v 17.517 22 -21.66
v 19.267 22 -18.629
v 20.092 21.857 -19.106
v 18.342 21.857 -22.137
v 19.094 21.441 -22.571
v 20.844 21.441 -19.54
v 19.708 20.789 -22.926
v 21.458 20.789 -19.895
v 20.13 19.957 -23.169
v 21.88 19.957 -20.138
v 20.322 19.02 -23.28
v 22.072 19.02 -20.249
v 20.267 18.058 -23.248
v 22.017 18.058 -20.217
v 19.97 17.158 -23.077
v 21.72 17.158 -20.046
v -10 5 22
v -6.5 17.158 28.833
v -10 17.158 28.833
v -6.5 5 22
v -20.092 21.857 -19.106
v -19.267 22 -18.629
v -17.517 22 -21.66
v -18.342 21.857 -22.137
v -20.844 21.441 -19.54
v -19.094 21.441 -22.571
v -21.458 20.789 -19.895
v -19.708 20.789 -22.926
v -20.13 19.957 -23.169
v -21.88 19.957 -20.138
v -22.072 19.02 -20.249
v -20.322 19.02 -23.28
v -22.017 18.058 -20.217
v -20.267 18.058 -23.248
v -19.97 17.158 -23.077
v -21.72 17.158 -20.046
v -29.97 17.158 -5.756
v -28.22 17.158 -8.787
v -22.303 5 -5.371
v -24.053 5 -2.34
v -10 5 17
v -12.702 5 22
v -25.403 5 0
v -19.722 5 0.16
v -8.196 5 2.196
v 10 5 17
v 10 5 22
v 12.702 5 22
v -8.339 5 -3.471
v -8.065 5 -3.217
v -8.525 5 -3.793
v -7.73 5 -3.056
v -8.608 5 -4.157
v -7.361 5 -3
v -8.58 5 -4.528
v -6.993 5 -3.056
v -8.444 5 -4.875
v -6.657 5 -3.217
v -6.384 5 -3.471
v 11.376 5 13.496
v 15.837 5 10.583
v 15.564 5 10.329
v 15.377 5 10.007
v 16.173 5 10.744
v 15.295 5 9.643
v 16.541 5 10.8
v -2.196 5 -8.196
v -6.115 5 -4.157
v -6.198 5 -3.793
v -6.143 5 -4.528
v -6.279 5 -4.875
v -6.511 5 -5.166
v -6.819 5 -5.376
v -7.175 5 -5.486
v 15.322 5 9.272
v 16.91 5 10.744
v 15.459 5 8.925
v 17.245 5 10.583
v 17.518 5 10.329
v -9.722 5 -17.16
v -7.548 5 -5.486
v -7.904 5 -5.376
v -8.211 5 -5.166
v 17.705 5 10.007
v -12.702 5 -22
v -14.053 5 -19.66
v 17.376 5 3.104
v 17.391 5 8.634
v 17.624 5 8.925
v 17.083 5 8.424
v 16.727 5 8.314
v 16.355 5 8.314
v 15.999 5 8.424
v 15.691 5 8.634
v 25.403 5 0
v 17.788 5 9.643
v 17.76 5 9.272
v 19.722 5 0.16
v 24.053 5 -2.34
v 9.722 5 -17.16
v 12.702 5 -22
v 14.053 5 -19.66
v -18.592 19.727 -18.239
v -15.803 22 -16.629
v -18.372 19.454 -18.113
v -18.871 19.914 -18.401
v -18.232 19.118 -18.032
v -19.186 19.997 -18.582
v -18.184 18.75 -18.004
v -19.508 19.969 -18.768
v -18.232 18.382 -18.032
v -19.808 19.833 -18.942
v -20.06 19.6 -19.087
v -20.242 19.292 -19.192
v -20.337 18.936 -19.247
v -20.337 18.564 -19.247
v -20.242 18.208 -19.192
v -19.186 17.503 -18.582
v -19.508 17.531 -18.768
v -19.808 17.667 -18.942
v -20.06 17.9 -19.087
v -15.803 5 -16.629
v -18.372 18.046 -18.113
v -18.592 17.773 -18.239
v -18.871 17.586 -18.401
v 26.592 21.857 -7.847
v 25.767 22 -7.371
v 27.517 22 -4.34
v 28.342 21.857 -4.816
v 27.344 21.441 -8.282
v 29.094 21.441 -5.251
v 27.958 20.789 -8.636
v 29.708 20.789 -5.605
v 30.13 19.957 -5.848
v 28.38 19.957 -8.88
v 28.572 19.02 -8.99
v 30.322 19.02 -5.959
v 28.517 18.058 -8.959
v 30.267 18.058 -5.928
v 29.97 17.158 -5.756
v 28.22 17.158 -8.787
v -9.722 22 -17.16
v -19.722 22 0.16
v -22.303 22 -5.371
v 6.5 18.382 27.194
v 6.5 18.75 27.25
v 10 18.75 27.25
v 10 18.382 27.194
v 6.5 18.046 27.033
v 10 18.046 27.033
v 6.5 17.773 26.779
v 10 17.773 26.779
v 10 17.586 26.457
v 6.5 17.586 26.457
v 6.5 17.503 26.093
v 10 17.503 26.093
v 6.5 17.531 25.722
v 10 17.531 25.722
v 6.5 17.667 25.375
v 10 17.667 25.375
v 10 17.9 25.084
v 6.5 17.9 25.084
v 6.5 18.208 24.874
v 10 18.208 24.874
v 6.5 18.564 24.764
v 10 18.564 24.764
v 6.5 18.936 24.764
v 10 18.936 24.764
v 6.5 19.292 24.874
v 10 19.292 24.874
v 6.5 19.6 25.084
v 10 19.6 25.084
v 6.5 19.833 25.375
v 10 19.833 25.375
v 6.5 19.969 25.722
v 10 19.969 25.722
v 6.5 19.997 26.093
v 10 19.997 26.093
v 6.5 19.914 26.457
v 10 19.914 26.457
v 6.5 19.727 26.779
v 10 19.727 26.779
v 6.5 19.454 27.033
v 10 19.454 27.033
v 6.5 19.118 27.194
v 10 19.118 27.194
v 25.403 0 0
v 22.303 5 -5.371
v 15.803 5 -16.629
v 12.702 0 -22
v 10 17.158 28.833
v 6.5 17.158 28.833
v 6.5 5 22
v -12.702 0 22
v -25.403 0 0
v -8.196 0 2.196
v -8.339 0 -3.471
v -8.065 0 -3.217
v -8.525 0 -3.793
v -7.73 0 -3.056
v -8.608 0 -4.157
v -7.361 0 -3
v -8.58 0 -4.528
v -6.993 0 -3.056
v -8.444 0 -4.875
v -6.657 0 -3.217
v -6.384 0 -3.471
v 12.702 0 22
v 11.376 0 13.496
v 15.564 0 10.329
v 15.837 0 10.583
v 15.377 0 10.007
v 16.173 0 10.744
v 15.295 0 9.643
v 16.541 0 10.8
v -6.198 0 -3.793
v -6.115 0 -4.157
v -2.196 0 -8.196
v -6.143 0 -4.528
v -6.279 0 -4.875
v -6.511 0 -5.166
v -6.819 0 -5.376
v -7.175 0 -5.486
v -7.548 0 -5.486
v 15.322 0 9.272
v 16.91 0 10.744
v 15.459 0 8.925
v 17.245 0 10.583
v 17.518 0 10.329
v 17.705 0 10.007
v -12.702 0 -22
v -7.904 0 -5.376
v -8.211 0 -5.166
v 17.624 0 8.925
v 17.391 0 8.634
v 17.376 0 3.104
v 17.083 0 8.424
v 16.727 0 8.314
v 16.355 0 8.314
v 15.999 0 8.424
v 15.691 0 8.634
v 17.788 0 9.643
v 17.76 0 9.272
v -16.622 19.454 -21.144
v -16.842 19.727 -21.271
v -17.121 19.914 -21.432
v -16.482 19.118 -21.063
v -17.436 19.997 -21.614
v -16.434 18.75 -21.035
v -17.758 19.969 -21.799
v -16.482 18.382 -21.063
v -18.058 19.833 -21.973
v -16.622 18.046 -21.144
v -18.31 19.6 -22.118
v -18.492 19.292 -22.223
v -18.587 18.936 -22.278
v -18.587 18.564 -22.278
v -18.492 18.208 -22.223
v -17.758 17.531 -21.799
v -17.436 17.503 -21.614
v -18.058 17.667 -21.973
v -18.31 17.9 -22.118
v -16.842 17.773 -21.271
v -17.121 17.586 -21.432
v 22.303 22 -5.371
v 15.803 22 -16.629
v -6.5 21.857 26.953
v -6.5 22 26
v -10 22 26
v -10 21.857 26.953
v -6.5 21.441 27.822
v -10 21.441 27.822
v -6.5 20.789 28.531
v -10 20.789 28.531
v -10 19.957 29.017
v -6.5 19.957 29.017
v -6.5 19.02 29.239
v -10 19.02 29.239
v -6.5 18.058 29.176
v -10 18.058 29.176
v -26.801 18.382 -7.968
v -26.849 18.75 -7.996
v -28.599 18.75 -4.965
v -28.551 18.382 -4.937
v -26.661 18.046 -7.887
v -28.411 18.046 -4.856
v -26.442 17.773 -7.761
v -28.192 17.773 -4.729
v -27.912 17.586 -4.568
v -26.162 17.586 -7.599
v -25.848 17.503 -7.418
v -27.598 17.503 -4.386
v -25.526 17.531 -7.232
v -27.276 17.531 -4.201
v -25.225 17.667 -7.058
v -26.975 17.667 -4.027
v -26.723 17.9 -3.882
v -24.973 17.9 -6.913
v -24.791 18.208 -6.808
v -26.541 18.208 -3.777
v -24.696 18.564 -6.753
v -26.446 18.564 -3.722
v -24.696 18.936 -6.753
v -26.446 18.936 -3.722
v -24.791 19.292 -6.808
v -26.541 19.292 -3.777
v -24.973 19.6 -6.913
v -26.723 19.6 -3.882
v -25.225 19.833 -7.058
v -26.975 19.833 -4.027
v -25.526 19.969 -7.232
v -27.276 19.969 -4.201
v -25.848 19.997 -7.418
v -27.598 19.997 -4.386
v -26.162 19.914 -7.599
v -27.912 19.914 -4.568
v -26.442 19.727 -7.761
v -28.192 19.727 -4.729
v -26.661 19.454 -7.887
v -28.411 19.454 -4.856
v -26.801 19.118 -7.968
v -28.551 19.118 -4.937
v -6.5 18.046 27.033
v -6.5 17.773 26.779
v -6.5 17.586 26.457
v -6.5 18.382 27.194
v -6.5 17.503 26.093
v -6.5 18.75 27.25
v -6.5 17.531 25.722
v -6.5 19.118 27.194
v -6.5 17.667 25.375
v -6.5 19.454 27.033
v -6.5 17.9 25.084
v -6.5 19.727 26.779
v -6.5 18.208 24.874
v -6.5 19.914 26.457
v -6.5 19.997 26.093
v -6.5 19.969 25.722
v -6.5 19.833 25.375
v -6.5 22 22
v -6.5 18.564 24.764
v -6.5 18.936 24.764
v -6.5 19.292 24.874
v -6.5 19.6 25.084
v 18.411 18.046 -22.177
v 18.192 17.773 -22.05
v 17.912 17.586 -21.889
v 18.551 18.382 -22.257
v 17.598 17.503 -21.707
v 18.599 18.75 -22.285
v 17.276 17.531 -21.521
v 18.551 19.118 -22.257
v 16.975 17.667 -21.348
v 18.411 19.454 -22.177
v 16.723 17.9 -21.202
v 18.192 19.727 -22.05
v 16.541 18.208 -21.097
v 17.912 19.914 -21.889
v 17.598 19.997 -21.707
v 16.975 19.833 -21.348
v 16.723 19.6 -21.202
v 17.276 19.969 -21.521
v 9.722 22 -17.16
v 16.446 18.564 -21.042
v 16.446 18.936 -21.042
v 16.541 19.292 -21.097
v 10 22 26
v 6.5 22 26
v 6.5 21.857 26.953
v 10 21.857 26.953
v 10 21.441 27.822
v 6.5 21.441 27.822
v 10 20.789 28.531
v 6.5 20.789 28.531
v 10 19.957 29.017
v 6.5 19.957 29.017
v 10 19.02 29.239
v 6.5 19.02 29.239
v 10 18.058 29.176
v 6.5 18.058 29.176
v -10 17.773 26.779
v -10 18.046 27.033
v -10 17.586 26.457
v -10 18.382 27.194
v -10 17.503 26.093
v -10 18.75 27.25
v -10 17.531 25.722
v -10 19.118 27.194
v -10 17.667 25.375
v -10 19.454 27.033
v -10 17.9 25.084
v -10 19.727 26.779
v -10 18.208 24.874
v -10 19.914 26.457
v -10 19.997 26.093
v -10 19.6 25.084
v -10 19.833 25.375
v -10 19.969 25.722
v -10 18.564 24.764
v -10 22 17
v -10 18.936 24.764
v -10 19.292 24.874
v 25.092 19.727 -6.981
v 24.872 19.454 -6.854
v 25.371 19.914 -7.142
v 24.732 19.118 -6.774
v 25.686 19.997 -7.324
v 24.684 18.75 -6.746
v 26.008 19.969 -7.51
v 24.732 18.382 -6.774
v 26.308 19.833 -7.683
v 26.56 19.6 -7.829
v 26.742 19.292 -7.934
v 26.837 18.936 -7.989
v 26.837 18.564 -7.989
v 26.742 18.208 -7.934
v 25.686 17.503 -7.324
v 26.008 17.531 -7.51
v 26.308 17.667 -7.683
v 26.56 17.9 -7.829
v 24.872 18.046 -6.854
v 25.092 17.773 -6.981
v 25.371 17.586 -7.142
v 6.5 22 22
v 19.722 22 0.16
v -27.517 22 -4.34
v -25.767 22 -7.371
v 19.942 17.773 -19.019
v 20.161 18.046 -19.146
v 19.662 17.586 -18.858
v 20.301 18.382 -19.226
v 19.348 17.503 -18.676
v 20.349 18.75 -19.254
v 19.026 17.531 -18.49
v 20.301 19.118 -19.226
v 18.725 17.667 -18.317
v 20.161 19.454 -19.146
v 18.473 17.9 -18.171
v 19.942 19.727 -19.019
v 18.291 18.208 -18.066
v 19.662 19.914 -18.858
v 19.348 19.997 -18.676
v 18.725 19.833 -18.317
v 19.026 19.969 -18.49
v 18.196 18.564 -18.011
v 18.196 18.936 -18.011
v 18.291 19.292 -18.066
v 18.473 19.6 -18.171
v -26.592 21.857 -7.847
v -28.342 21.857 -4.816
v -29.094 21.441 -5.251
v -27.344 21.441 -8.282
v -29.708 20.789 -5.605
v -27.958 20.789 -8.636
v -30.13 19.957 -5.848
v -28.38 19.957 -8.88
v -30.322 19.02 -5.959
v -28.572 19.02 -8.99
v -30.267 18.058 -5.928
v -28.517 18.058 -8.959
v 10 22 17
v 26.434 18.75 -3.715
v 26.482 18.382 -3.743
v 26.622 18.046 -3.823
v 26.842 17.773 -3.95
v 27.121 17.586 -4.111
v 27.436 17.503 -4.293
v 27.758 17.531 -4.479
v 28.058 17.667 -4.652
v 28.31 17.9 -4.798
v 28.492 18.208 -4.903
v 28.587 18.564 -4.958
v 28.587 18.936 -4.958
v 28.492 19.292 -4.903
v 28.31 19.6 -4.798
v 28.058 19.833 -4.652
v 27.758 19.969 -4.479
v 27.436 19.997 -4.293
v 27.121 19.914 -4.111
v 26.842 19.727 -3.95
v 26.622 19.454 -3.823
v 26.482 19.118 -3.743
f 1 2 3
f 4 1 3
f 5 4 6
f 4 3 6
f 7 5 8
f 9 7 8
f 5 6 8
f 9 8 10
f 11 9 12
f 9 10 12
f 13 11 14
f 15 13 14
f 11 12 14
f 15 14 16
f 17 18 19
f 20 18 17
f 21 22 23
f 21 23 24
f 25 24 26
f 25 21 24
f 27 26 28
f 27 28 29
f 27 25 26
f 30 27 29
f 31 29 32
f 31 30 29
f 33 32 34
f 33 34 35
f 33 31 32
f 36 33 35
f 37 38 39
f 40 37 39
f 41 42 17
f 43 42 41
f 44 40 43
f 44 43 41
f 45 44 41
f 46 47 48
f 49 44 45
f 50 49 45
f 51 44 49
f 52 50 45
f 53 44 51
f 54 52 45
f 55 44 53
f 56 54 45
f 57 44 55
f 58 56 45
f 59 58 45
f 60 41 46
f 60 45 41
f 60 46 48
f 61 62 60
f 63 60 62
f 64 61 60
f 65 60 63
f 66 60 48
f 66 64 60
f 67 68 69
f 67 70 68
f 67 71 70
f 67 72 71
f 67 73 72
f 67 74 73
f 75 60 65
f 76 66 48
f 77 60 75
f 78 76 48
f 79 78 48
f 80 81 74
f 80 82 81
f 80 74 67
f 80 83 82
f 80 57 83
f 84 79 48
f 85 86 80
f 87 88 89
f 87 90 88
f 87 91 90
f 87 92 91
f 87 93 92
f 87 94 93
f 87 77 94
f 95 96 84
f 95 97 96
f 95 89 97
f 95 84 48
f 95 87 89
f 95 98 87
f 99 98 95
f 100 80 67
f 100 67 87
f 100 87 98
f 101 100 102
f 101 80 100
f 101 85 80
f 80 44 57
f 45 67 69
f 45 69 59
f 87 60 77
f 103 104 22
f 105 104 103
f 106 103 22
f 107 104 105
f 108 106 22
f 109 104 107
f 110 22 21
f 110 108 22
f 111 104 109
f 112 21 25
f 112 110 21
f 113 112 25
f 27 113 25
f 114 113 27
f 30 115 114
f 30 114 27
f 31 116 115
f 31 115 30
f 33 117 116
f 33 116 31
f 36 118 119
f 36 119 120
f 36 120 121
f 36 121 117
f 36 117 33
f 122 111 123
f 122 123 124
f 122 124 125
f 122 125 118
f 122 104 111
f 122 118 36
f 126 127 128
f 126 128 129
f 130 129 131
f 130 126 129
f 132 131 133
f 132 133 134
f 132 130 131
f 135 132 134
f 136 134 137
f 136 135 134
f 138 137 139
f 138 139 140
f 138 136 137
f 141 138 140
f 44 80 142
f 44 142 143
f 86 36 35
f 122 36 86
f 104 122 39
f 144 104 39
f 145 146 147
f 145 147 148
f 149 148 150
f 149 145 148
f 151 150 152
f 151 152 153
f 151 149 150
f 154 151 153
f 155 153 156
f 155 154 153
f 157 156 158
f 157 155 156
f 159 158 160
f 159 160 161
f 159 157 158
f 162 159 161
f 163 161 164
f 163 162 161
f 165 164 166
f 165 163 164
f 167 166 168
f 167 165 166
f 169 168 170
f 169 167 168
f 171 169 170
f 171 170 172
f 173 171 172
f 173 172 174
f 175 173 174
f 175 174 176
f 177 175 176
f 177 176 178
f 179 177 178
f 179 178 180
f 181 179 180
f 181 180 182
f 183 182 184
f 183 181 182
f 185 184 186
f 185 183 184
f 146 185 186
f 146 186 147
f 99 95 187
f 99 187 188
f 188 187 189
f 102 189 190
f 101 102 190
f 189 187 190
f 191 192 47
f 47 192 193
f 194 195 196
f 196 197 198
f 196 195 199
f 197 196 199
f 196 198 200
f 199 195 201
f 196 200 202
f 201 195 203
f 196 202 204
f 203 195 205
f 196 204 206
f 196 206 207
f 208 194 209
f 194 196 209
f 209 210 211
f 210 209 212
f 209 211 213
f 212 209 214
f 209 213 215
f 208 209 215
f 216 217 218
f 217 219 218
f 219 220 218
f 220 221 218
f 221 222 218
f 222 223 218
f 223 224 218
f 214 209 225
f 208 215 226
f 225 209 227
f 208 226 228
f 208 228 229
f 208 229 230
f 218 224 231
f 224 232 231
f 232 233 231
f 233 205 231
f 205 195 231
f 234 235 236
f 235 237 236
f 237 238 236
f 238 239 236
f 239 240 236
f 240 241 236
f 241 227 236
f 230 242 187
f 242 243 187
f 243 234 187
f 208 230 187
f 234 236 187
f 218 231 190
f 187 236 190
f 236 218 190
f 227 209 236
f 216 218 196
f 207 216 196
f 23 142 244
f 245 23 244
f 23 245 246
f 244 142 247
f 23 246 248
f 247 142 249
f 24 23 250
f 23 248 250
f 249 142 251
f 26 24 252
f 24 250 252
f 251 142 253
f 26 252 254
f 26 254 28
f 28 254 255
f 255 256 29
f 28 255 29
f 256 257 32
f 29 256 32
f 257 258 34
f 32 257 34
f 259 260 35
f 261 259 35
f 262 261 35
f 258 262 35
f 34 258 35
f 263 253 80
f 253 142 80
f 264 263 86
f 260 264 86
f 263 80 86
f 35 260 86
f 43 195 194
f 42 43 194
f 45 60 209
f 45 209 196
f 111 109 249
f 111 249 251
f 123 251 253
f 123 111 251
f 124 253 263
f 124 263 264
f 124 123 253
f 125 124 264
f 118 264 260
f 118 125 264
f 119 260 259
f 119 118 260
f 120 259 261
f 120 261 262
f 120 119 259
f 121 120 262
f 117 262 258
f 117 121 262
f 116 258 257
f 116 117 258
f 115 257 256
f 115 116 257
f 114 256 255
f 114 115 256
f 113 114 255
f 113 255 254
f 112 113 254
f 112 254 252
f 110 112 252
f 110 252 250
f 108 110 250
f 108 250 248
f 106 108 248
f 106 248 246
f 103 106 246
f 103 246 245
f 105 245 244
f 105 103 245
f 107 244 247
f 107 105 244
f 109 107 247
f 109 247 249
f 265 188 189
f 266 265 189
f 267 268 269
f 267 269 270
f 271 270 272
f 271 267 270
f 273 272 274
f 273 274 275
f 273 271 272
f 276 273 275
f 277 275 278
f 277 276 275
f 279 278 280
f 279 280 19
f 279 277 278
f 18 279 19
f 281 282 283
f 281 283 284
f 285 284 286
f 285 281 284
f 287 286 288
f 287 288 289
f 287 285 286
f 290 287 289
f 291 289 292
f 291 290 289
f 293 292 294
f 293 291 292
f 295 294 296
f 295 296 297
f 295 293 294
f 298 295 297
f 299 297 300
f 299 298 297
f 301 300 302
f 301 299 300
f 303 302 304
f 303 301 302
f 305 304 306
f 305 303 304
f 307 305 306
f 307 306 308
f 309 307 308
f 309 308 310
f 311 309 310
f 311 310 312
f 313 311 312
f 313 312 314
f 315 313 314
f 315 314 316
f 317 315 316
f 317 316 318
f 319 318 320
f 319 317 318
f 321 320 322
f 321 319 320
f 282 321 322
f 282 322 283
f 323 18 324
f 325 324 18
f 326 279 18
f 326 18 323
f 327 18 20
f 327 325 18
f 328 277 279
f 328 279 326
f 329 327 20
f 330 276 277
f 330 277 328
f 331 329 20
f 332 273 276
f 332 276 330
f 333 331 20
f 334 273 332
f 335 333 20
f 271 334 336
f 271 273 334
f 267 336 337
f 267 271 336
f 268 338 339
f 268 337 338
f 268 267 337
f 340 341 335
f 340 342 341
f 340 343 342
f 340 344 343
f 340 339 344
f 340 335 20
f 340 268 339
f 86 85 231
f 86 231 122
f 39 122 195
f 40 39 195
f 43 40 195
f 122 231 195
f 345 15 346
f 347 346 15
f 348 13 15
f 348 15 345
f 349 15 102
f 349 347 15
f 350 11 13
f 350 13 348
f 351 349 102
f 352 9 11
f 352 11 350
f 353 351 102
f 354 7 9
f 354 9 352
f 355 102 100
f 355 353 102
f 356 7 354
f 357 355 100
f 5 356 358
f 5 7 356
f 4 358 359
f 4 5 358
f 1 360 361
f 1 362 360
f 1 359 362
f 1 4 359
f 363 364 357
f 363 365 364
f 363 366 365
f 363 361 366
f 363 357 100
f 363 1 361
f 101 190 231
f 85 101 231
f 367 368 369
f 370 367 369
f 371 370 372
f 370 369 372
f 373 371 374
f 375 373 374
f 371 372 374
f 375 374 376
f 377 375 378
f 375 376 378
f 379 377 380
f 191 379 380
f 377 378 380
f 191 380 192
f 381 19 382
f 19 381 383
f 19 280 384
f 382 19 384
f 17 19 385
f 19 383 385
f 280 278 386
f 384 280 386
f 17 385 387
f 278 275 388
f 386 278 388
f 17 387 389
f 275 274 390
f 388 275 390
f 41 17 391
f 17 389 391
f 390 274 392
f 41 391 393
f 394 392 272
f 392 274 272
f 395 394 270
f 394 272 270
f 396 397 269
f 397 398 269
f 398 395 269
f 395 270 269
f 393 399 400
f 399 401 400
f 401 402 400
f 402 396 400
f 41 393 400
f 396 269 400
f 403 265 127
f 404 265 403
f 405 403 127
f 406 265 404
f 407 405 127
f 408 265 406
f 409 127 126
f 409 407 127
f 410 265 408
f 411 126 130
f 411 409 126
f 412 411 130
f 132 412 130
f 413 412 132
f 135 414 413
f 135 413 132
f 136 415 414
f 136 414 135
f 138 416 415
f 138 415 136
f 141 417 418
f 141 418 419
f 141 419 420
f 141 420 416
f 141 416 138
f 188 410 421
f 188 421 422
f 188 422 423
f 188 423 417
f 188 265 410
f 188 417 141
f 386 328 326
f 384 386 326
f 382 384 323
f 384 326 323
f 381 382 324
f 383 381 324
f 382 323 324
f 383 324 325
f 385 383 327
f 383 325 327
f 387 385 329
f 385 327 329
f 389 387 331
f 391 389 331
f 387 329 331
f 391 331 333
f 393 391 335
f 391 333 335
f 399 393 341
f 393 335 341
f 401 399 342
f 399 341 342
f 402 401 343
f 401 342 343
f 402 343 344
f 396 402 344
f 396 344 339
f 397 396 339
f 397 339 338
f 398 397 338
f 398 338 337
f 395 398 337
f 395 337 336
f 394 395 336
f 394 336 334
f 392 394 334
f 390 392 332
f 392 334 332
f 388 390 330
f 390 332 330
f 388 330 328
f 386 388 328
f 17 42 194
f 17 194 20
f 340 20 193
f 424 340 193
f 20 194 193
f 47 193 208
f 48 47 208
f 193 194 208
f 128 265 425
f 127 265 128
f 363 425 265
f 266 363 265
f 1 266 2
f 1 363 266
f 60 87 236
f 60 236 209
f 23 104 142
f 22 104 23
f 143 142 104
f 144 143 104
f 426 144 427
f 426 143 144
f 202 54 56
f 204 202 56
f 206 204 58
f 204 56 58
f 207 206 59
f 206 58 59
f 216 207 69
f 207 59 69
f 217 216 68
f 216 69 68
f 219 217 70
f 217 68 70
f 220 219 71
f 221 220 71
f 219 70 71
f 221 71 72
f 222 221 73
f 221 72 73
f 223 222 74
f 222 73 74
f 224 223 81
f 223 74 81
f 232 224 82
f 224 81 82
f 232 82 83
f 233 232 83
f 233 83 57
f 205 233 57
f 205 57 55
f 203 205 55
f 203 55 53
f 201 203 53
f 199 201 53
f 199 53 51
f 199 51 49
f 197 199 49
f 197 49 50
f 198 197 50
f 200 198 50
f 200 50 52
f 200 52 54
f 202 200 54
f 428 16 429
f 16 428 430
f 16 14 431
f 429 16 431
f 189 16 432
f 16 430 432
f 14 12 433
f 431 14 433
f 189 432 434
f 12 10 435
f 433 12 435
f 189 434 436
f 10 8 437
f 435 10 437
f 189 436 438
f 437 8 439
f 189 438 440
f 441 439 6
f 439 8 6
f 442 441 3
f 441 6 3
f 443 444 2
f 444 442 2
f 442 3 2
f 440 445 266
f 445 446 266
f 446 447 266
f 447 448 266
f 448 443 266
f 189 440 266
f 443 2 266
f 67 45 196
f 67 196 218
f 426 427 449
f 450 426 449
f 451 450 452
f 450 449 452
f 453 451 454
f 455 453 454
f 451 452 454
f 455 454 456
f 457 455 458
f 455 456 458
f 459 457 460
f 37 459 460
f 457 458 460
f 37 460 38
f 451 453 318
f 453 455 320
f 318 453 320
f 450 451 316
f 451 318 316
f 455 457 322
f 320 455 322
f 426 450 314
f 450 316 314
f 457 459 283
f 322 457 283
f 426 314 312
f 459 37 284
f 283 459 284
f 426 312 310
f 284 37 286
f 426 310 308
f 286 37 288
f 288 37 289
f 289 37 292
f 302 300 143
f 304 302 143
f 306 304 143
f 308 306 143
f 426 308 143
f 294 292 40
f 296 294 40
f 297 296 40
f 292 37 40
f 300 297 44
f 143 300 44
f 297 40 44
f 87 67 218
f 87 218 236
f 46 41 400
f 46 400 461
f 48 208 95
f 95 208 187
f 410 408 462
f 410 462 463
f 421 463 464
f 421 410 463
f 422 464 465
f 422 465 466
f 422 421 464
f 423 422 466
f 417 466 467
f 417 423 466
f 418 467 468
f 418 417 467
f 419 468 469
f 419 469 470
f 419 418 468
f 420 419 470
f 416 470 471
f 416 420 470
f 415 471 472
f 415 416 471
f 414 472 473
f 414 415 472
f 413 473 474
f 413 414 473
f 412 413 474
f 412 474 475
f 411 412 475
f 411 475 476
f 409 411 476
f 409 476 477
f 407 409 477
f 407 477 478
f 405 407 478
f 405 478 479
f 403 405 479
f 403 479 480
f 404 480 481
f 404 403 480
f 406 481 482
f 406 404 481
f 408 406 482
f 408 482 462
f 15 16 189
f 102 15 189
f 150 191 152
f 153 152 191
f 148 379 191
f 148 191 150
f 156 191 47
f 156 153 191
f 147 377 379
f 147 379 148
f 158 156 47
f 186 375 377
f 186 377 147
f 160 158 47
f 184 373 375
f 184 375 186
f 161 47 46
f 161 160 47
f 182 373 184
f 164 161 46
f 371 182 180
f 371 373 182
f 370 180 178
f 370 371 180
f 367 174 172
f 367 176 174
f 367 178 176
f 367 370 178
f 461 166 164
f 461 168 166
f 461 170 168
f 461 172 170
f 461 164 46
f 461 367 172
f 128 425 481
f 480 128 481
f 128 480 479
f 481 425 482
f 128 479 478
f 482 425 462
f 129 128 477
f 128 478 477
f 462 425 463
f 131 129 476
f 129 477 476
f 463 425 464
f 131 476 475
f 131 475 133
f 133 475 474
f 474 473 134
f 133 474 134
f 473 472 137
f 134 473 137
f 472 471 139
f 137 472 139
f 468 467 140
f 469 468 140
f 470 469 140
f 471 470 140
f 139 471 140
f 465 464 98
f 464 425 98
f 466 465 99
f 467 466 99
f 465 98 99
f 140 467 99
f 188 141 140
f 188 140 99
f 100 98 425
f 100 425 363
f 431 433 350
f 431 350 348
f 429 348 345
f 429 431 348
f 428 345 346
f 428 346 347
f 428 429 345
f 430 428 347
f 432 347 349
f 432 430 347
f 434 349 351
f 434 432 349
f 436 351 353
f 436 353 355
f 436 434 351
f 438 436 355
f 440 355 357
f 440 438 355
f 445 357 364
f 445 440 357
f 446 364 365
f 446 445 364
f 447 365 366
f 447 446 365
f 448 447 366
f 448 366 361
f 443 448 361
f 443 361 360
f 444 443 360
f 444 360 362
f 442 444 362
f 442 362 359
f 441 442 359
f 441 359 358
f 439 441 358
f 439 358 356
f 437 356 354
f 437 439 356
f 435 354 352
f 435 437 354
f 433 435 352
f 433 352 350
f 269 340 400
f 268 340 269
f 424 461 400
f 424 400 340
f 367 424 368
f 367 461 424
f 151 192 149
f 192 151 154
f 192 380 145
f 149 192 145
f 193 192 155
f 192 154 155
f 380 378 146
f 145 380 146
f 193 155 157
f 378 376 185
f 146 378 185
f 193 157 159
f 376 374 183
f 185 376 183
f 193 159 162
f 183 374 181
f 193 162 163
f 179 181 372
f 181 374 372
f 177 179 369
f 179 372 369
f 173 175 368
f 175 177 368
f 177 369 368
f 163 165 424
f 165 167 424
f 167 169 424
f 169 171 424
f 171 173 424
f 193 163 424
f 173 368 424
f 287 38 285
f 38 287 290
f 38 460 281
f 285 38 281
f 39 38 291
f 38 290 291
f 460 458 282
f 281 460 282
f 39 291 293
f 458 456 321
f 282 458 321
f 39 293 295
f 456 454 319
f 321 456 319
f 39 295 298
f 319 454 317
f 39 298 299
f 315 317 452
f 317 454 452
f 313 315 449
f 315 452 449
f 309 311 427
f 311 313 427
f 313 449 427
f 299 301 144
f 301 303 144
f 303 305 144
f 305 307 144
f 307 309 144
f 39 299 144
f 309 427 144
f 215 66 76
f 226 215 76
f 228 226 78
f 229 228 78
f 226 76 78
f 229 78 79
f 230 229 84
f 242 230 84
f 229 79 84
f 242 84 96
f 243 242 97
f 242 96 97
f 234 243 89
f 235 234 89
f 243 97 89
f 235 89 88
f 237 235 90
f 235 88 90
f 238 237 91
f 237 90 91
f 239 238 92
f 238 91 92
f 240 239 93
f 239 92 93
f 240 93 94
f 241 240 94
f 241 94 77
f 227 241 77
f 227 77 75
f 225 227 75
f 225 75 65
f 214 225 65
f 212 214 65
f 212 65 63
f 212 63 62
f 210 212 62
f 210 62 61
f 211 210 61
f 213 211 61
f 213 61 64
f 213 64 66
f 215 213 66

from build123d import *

# Parameters (mm, degrees)
BOSS_EXTRUDE1_DEPTH         = 5
SKETCH4_W                   = 20
SKETCH4_H                   = 5
BOSS_EXTRUDE3_DEPTH         = 17
BOSS_EXTRUDE2_START         = 6.5
SKETCH2_R                   = 1.25
BOSS_EXTRUDE2_DEPTH         = 3.5
CIRPATTERN1_COUNT           = 3
CIRPATTERN1_COPY_1_SKETCH_W = 20
CIRPATTERN1_COPY_1_SKETCH_H = 5
CIRPATTERN1_COPY_1_DEPTH    = 17
CIRPATTERN1_COPY_2_SKETCH_W = 20
CIRPATTERN1_COPY_2_SKETCH_H = 5
CIRPATTERN1_COPY_2_DEPTH    = 17
CIRPATTERN1_START           = 6.5
CIRPATTERN1_COPY_3_SKETCH_R = 1.25
CIRPATTERN1_COPY_3_DEPTH    = 3.5
CIRPATTERN1_COPY_4_SKETCH_R = 1.25
CIRPATTERN1_COPY_4_DEPTH    = 3.5
CUT_EXTRUDE1_REACH          = 47.437
CUT_EXTRUDE2_REACH          = 47.437
SKETCH6_R                   = 1.25


with BuildPart() as part:
    # Sketch1 → Boss-Extrude1 (new body)
    with BuildSketch(Plane(origin=(0, 0, 0), x_dir=(1, 0, 0), z_dir=(0, 1, 0))):
        Polygon((25.403411844, 0), (12.701705922, 22), (-12.701705922, 22), (-25.403411844, 0), (-12.701705922, -22), (12.701705922, -22), align=None)
    extrude(amount=BOSS_EXTRUDE1_DEPTH)

    # Sketch4 → Boss-Extrude3 (add)
    with BuildSketch(Plane(origin=(0, 5, 0), x_dir=(1, 0, 0), z_dir=(0, 1, 0))):
        with Locations((0, -19.5)):
            Rectangle(SKETCH4_W, SKETCH4_H)
    boss_extrude3 = extrude(amount=BOSS_EXTRUDE3_DEPTH)

    # Sketch2 → Boss-Extrude2 (add)
    with BuildSketch(Plane(origin=(0, 0, 0), x_dir=(0, 0, -1), z_dir=(1, 0, 0)).offset(BOSS_EXTRUDE2_START)):
        with BuildLine():
            Line((-22, 22), (-26, 22))
            ThreePointArc((-26, 22), (-28.805149023, 20.391230928), (-28.83316759, 17.157623974))
            Line((-28.83316759, 17.157623974), (-22, 5))
            Line((-22, 5), (-22, 22))
        make_face()
        with Locations(Location((-26, 18.75, 0), (0, 0, 180))):
            Circle(SKETCH2_R, mode=Mode.SUBTRACT)
    boss_extrude2 = extrude(amount=BOSS_EXTRUDE2_DEPTH)

    # Mirror1: Boss-Extrude3, Boss-Extrude2 across plane
    add(boss_extrude3.mirror(Plane(origin=(0, 0, 0), x_dir=(0, 0, 1), z_dir=(1, 0, 0))))
    add(boss_extrude2.mirror(Plane(origin=(0, 0, 0), x_dir=(0, 0, 1), z_dir=(1, 0, 0))))

    # CirPattern1: Boss-Extrude3, Boss-Extrude2 ×3 about axis
    cirpattern1_axis = Axis((0, 0, 0), (0, 1, 0))
    add([boss_extrude3.rotate(cirpattern1_axis, i * 360 / CIRPATTERN1_COUNT) for i in range(1, CIRPATTERN1_COUNT)])
    add([boss_extrude2.rotate(cirpattern1_axis, i * 360 / CIRPATTERN1_COUNT) for i in range(1, CIRPATTERN1_COUNT)])

    # CirPattern1 copy 1 sketch → CirPattern1 copy 1 (add)
    with BuildSketch(Plane(origin=(0, 5, 0), x_dir=(0.4999999999999998, 0, 0.8660254037844387), z_dir=(0, 1, 0))):
        with Locations((0, 19.5)):
            Rectangle(CIRPATTERN1_COPY_1_SKETCH_W, CIRPATTERN1_COPY_1_SKETCH_H)
    extrude(amount=CIRPATTERN1_COPY_1_DEPTH)

    # CirPattern1 copy 2 sketch → CirPattern1 copy 2 (add)
    with BuildSketch(Plane(origin=(0, 5, 0), x_dir=(0.5000000000000004, 0, -0.8660254037844384), z_dir=(0, 1, 0))):
        with Locations((0, 19.5)):
            Rectangle(CIRPATTERN1_COPY_2_SKETCH_W, CIRPATTERN1_COPY_2_SKETCH_H)
    extrude(amount=CIRPATTERN1_COPY_2_DEPTH)

    # CirPattern1 copy 3 sketch → CirPattern1 copy 3 (add)
    with BuildSketch(Plane(origin=(0, 0, 0), x_dir=(-0.8660254037844387, 0, 0.4999999999999998), z_dir=(0.4999999999999998, 0, 0.8660254037844387)).offset(CIRPATTERN1_START)):
        with BuildLine():
            Line((-22, -22), (-26, -22))
            ThreePointArc((-26, -22), (-28.805149023, -20.391230928), (-28.83316759, -17.157623974))
            Line((-28.83316759, -17.157623974), (-22, -5))
            Line((-22, -5), (-22, -22))
        make_face()
        with Locations((-26, -18.75)):
            Circle(CIRPATTERN1_COPY_3_SKETCH_R, mode=Mode.SUBTRACT)
    extrude(amount=CIRPATTERN1_COPY_3_DEPTH)

    # CirPattern1 copy 4 sketch → CirPattern1 copy 4 (add)
    with BuildSketch(Plane(origin=(0, 0, 0), x_dir=(0.8660254037844384, 0, 0.5000000000000004), z_dir=(0.5000000000000004, 0, -0.8660254037844384)).offset(CIRPATTERN1_START)):
        with BuildLine():
            Line((-22, -22), (-26, -22))
            ThreePointArc((-26, -22), (-28.805149023, -20.391230928), (-28.83316759, -17.157623974))
            Line((-28.83316759, -17.157623974), (-22, -5))
            Line((-22, -5), (-22, -22))
        make_face()
        with Locations((-26, -18.75)):
            Circle(CIRPATTERN1_COPY_4_SKETCH_R, mode=Mode.SUBTRACT)
    extrude(amount=CIRPATTERN1_COPY_4_DEPTH)

    # Sketch3 → Cut-Extrude1 (cut, up to next)
    with BuildSketch(Plane(origin=(0, 5, 0), x_dir=(1, 0, 0), z_dir=(0, 1, 0)), mode=Mode.PRIVATE) as cut_extrude1_sk1:
        Polygon((-2.196152423, 8.196152423), (17.376021703, -3.103847577), (11.376021703, -13.496152423), (-8.196152423, -2.196152423), align=None)
    cut_extrude1_tool1 = extrude(cut_extrude1_sk1.sketch, amount=-CUT_EXTRUDE1_REACH, mode=Mode.PRIVATE) & part.part
    add(cut_extrude1_tool1.solids().sort_by_distance((4.589935, 5, 2.65))[0], mode=Mode.SUBTRACT)

    # Sketch6 → Cut-Extrude2 (cut, up to next)
    with BuildSketch(Plane(origin=(0, 5, 0), x_dir=(1, 0, 0), z_dir=(0, 1, 0)), mode=Mode.PRIVATE) as cut_extrude2_sk1:
        with Locations(Location((-7.361215932, 4.25, 0), (0, 0, 270))):
            Circle(SKETCH6_R)
    cut_extrude2_tool1 = extrude(cut_extrude2_sk1.sketch, amount=-CUT_EXTRUDE2_REACH, mode=Mode.PRIVATE) & part.part
    # Sketch6 → Cut-Extrude2 (cut, up to next)
    with BuildSketch(Plane(origin=(0, 5, 0), x_dir=(1, 0, 0), z_dir=(0, 1, 0)), mode=Mode.PRIVATE) as cut_extrude2_sk2:
        with Locations(Location((16.541085212, -9.55, 0), (0, 0, 270))):
            Circle(SKETCH6_R)
    cut_extrude2_tool2 = extrude(cut_extrude2_sk2.sketch, amount=-CUT_EXTRUDE2_REACH, mode=Mode.PRIVATE) & part.part
    add(cut_extrude2_tool1.solids().sort_by_distance((-7.361216, 5, -4.25))[0], mode=Mode.SUBTRACT)
    add(cut_extrude2_tool2.solids().sort_by_distance((16.541085, 5, 9.55))[0], mode=Mode.SUBTRACT)


solid = part.part
